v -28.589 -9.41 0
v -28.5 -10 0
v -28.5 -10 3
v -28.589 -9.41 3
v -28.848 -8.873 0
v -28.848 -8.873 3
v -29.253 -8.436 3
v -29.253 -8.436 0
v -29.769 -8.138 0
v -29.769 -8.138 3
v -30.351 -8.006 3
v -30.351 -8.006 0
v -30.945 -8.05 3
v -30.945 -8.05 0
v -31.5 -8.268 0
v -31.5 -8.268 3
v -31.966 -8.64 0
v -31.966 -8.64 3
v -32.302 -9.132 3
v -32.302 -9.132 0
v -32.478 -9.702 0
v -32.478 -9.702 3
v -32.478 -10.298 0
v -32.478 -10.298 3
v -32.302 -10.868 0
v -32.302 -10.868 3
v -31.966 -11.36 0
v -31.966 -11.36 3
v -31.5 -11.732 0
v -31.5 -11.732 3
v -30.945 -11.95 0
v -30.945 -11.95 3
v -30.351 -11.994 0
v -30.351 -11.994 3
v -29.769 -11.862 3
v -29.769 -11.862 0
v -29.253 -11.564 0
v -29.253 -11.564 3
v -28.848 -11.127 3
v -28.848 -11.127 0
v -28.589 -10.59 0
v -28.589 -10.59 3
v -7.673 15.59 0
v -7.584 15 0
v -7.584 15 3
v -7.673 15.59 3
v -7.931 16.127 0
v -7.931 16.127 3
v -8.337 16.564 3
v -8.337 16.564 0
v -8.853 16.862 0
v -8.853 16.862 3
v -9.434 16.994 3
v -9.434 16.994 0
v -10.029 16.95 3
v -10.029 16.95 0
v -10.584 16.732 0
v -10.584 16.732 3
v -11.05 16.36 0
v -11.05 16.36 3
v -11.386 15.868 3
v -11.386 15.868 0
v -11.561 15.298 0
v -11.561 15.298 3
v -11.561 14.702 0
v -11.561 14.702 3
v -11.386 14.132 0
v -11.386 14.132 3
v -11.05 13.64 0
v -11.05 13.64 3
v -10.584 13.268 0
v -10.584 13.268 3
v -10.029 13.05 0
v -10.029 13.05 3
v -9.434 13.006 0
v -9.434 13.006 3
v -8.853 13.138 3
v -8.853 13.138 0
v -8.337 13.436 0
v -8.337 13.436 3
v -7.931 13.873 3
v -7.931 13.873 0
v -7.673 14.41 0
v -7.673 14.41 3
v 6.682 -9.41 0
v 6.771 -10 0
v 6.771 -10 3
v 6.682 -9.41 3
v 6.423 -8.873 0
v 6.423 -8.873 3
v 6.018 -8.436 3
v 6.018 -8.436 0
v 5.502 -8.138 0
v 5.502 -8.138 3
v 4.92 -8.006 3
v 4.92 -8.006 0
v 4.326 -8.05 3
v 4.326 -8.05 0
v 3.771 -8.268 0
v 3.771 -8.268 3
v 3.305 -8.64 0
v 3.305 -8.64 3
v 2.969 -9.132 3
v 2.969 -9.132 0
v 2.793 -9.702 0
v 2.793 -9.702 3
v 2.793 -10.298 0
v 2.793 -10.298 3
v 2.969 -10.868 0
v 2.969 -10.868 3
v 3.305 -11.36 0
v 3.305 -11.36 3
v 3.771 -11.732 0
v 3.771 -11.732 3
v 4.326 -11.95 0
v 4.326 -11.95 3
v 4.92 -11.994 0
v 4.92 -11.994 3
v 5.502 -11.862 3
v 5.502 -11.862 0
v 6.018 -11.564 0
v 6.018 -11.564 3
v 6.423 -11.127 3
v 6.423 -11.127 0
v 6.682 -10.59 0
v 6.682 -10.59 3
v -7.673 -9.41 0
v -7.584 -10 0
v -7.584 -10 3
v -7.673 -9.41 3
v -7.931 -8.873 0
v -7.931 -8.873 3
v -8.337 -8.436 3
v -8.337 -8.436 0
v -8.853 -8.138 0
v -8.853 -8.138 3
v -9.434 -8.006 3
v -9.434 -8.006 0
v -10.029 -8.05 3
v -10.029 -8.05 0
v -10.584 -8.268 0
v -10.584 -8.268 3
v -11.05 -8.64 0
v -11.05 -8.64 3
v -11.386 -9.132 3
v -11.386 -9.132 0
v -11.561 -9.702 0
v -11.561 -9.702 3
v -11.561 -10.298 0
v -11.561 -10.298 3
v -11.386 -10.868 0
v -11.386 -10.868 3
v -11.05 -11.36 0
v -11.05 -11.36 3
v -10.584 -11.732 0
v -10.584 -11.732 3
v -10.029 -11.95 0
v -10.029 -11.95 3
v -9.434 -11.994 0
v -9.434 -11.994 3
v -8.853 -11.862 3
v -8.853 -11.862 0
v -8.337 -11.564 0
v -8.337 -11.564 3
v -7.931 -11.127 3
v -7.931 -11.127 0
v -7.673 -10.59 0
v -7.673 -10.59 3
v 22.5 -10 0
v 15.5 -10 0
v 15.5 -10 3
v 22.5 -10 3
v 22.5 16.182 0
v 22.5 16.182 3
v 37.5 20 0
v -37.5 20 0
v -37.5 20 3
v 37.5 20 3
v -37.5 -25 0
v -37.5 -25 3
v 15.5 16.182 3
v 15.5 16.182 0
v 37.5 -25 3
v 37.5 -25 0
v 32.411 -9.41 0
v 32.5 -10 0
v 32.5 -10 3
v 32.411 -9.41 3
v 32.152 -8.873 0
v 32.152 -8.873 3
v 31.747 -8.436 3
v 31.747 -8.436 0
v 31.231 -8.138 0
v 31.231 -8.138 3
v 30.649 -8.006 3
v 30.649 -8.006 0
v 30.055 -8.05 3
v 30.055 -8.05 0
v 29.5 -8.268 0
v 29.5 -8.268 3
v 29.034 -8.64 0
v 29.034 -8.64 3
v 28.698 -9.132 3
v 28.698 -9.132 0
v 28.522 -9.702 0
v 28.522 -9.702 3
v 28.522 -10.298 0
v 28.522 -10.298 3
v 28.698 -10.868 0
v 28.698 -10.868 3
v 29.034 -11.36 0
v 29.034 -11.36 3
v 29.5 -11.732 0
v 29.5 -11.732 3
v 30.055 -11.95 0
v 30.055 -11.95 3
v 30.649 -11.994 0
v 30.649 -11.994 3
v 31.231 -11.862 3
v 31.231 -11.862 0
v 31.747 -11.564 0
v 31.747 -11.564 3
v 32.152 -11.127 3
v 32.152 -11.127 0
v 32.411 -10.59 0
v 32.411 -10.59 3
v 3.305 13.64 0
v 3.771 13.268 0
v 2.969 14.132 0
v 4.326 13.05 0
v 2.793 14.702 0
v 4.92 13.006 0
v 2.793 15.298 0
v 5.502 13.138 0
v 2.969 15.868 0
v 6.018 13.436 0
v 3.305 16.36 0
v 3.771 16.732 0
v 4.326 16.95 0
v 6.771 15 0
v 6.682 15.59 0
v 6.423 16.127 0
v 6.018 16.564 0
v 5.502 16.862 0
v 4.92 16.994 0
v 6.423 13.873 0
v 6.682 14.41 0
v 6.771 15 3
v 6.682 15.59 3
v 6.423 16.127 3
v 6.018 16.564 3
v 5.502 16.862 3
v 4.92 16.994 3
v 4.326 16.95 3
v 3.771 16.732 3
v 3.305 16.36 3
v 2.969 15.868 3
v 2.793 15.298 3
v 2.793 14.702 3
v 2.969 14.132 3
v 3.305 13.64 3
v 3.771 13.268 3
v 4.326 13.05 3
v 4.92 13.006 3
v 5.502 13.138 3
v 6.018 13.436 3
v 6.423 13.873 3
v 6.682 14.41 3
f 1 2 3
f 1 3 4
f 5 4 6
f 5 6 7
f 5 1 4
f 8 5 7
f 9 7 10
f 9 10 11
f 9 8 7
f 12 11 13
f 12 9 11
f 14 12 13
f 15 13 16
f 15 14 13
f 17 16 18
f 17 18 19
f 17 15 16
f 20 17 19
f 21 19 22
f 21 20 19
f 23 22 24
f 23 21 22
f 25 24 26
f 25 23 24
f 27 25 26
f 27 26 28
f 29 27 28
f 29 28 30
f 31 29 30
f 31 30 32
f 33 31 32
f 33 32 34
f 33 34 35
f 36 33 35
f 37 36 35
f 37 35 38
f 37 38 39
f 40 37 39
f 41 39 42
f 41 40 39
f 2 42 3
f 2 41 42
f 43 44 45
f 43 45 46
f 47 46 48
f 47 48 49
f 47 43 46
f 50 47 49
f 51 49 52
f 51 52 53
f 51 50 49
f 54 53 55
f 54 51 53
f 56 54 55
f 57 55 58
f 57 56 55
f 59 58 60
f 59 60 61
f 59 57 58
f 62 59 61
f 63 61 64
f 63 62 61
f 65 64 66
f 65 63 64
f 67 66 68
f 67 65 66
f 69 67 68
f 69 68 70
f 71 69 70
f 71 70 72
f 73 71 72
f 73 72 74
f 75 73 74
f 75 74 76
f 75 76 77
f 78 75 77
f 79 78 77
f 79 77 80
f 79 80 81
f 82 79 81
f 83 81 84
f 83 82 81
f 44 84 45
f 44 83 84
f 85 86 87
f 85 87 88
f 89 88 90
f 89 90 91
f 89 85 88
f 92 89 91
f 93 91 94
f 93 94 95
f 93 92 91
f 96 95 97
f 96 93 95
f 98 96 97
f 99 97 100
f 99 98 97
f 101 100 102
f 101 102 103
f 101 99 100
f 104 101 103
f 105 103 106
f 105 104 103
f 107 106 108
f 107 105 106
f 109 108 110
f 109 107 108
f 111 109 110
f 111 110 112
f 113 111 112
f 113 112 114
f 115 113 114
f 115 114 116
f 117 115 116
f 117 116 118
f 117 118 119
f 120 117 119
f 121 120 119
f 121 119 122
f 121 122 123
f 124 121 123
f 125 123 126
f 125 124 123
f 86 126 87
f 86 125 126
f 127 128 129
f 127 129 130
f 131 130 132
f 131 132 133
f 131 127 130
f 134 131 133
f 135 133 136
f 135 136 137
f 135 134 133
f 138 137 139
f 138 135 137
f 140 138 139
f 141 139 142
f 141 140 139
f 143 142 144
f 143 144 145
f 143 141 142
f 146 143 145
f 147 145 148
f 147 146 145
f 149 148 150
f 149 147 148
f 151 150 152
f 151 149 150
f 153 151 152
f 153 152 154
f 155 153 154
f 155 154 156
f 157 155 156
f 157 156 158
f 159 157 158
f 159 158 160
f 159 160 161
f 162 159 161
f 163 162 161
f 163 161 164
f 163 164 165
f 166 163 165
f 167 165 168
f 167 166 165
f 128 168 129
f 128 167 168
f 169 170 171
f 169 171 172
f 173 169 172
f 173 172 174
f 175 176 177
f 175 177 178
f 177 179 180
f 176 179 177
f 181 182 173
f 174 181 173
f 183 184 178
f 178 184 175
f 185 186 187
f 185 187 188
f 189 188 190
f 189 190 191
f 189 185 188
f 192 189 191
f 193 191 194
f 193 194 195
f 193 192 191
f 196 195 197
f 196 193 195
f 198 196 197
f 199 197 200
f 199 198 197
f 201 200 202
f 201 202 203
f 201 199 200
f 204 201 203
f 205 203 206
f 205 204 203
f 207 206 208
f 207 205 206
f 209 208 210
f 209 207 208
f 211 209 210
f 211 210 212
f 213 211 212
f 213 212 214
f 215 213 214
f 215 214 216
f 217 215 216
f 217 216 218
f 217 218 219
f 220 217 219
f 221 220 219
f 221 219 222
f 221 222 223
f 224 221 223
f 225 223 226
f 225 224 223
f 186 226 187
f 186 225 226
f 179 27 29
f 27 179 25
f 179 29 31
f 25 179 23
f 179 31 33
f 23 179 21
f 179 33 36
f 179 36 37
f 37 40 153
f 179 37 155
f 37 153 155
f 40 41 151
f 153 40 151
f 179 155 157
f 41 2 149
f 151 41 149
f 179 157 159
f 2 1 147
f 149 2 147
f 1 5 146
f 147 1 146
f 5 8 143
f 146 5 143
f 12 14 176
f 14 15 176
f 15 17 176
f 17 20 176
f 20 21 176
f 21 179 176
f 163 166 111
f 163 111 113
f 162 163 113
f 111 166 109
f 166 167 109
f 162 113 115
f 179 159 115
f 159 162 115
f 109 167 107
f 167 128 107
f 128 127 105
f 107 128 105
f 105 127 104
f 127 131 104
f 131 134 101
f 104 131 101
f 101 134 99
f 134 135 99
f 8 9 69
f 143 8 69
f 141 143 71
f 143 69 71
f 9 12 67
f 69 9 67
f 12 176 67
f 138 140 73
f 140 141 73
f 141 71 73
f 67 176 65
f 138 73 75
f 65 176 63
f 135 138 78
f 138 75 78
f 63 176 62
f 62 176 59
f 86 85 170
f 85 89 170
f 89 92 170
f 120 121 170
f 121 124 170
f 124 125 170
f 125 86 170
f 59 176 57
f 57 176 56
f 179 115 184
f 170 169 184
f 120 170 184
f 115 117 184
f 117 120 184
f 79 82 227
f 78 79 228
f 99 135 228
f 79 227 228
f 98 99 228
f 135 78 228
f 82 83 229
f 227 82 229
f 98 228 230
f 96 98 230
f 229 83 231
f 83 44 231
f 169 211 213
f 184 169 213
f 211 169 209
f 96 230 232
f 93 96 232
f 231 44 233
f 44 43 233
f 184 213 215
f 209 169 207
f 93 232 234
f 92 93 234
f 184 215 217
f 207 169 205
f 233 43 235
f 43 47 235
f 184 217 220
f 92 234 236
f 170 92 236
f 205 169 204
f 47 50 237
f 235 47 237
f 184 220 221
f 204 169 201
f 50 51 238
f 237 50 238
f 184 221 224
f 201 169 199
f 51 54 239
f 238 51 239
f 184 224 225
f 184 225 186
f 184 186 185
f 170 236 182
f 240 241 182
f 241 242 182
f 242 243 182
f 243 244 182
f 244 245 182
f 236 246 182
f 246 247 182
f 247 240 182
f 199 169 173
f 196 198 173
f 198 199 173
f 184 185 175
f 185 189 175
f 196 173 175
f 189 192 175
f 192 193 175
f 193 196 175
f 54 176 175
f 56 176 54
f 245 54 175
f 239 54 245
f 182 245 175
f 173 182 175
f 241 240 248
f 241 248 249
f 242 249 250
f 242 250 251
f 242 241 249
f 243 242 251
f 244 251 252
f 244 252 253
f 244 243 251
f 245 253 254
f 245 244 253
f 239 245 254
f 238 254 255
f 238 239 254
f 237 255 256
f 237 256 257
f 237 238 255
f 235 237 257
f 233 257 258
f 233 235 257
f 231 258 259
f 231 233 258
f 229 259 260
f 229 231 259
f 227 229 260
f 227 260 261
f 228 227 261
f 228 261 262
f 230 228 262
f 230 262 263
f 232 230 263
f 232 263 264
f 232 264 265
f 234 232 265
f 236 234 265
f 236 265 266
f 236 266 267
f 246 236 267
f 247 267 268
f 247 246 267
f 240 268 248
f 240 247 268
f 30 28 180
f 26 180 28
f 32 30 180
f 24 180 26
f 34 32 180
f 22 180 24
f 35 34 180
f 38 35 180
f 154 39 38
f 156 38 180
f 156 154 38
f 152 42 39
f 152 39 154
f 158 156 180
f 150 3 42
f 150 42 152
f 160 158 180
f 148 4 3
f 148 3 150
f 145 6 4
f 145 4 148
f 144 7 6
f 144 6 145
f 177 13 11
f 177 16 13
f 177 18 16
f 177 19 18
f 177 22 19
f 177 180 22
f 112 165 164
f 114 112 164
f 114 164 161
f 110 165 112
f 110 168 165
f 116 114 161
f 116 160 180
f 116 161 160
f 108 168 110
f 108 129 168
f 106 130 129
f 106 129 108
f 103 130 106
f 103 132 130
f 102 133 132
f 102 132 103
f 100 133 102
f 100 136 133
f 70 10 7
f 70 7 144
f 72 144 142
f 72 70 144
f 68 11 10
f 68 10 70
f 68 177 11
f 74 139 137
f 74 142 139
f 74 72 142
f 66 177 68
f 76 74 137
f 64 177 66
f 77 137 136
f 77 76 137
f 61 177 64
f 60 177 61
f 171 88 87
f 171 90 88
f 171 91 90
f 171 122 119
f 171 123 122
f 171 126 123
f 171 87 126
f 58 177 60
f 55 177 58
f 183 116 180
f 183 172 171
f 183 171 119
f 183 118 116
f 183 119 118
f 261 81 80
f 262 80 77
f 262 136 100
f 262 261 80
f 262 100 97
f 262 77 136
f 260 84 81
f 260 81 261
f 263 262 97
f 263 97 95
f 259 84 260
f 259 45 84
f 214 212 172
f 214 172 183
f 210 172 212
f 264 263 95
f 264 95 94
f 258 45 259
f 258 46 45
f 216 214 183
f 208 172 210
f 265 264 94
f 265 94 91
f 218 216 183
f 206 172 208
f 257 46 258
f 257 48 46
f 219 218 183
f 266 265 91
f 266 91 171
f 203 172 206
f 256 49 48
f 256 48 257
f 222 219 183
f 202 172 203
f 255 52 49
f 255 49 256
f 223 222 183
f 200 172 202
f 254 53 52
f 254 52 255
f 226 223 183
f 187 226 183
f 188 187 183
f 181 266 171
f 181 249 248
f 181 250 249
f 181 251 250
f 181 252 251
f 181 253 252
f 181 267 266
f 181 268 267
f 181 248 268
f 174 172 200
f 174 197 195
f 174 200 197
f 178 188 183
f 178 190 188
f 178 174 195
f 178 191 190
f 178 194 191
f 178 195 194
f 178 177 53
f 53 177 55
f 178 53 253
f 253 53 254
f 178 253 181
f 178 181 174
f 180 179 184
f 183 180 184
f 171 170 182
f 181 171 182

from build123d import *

# Parameters (mm, degrees)
SKETCH1_W           = 75
SKETCH1_H           = 40
SKETCH1_R           = 2
SKETCH1_W_2         = 7
SKETCH1_H_2         = 26.182038529
BOSS_EXTRUDE1_DEPTH = 3
SKETCH2_W           = 75
SKETCH2_H           = 5
BOSS_EXTRUDE2_DEPTH = 3


with BuildPart() as part:
    # Sketch1 → Boss-Extrude1 (new body)
    with BuildSketch(Plane.XY):
        Rectangle(SKETCH1_W, SKETCH1_H)
        with Locations((-30.5, -10)):
            Circle(SKETCH1_R, mode=Mode.SUBTRACT)
        with Locations((30.5, -10)):
            Circle(SKETCH1_R, mode=Mode.SUBTRACT)
        with Locations((4.771003885, 15)):
            Circle(SKETCH1_R, mode=Mode.SUBTRACT)
        with Locations((4.771003885, -10)):
            Circle(SKETCH1_R, mode=Mode.SUBTRACT)
        with Locations((-9.583817368, -10)):
            Circle(SKETCH1_R, mode=Mode.SUBTRACT)
        with Locations((-9.583817368, 15)):
            Circle(SKETCH1_R, mode=Mode.SUBTRACT)
        with Locations((19, 3.091019264)):
            Rectangle(SKETCH1_W_2, SKETCH1_H_2, mode=Mode.SUBTRACT)
    extrude(amount=BOSS_EXTRUDE1_DEPTH)

    # Sketch2 → Boss-Extrude2 (add)
    with BuildSketch(Plane.XY):
        with Locations((0, -22.5)):
            Rectangle(SKETCH2_W, SKETCH2_H)
    extrude(amount=BOSS_EXTRUDE2_DEPTH)


solid = part.part
